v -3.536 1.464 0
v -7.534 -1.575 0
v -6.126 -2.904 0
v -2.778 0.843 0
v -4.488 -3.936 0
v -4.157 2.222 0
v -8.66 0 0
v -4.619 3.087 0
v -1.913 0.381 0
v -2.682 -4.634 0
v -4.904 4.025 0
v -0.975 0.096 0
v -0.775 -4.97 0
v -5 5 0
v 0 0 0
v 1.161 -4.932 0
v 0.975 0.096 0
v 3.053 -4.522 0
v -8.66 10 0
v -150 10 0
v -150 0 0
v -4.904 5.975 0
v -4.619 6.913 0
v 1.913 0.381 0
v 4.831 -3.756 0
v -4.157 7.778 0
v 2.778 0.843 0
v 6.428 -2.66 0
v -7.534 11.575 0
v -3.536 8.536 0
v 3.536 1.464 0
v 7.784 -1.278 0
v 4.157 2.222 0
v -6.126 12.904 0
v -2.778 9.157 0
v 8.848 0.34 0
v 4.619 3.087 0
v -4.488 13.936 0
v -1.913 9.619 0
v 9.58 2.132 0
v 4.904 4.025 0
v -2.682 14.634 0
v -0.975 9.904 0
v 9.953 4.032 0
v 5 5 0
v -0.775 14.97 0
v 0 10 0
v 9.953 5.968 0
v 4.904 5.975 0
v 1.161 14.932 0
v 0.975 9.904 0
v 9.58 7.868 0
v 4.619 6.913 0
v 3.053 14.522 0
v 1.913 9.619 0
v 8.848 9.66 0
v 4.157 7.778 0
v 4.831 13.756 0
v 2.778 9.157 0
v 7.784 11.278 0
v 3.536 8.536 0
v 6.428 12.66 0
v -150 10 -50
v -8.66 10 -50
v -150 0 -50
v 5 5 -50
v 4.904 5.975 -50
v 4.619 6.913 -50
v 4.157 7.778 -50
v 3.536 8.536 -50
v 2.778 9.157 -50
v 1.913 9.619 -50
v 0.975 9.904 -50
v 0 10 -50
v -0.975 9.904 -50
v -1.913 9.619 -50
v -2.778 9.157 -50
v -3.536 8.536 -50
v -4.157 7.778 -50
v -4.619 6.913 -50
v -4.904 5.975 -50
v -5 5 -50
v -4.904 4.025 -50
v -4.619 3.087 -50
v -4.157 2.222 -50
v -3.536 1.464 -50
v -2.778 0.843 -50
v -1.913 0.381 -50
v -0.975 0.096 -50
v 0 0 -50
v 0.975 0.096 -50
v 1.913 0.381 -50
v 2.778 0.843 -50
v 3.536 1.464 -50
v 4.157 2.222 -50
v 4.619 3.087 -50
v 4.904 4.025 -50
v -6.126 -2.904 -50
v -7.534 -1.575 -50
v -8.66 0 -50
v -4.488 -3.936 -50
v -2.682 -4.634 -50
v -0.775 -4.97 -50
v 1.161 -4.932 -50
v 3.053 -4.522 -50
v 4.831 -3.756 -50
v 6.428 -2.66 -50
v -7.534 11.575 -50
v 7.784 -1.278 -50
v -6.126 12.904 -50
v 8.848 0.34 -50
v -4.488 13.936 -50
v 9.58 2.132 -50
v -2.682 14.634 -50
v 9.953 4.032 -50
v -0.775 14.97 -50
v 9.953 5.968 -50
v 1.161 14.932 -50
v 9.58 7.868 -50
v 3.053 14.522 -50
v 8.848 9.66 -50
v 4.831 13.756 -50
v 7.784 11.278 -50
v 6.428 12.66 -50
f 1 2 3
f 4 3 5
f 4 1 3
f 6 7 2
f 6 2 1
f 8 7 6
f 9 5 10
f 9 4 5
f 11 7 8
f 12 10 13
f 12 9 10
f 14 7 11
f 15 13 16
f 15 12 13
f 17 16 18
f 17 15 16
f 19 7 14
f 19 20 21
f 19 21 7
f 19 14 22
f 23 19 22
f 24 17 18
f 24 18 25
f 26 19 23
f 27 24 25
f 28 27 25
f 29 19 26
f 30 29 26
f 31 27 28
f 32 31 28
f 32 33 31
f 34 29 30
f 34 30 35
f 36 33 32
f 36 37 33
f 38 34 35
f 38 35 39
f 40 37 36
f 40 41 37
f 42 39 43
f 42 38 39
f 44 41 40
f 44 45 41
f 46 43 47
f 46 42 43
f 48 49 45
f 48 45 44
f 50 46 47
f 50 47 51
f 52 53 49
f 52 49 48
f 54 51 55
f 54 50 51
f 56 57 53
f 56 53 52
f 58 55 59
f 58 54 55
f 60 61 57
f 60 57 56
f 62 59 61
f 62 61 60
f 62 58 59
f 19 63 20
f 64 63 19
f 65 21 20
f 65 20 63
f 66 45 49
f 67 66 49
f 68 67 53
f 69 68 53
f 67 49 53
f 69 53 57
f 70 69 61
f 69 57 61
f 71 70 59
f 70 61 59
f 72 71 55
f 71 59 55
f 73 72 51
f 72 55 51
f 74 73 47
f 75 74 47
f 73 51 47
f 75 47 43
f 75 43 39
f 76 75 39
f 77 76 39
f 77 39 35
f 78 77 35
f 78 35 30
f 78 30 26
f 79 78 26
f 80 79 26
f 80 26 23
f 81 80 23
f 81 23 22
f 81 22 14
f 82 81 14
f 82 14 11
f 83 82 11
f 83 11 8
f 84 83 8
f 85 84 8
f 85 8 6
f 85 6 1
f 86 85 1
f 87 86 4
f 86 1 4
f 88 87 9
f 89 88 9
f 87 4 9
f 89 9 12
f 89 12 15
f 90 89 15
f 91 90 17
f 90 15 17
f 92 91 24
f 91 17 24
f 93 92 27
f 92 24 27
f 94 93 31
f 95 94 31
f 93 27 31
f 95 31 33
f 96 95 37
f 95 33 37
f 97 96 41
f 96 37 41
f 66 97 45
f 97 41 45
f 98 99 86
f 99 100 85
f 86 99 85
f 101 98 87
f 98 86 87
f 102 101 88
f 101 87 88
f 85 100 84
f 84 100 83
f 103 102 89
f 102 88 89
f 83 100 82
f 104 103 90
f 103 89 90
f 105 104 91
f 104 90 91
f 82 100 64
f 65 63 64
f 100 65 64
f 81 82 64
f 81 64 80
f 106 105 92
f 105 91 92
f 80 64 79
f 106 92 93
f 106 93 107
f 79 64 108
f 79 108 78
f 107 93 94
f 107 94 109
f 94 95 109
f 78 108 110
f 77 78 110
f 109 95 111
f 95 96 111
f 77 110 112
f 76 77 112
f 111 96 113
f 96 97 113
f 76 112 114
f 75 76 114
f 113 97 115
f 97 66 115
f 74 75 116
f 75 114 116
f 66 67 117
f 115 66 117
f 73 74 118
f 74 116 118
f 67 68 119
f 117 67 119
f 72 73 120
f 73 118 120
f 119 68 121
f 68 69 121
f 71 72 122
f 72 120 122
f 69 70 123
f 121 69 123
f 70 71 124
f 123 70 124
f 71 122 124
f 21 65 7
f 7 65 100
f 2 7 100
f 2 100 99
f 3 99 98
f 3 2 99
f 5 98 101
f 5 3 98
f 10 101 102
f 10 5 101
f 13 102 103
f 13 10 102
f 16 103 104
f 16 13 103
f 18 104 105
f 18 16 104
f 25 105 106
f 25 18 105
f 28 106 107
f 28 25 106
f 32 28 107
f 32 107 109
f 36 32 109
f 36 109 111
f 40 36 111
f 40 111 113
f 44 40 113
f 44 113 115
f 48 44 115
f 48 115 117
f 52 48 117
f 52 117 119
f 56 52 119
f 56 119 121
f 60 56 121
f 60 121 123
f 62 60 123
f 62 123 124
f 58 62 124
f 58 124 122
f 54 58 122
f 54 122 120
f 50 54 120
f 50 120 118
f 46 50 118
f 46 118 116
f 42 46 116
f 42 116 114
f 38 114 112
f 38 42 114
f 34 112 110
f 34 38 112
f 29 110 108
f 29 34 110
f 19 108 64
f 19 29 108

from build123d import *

# Parameters (mm, degrees)
SKETCH1_W           = 150
SKETCH1_H           = 50
BOSS_EXTRUDE1_DEPTH = 10
SKETCH2_R           = 10
BOSS_EXTRUDE2_DEPTH = 50
SKETCH3_R           = 5
CUT_EXTRUDE1_DEPTH  = 51


with BuildPart() as part:
    # Sketch1 → Boss-Extrude1 (new body)
    with BuildSketch(Plane(origin=(0, 0, 0), x_dir=(1, 0, 0), z_dir=(0, 1, 0))):
        with Locations((-75, 25)):
            Rectangle(SKETCH1_W, SKETCH1_H)
    extrude(amount=BOSS_EXTRUDE1_DEPTH)

    # Sketch2 → Boss-Extrude2 (add, through all)
    with BuildSketch(Plane.XY):
        with Locations((0, 5)):
            Circle(SKETCH2_R)
    extrude(amount=-BOSS_EXTRUDE2_DEPTH)

    # Sketch3 → Cut-Extrude1 (cut, through all)
    with BuildSketch(Plane.XY):
        with Locations((0, 5)):
            Circle(SKETCH3_R)
    extrude(amount=-CUT_EXTRUDE1_DEPTH, mode=Mode.SUBTRACT)


solid = part.part
